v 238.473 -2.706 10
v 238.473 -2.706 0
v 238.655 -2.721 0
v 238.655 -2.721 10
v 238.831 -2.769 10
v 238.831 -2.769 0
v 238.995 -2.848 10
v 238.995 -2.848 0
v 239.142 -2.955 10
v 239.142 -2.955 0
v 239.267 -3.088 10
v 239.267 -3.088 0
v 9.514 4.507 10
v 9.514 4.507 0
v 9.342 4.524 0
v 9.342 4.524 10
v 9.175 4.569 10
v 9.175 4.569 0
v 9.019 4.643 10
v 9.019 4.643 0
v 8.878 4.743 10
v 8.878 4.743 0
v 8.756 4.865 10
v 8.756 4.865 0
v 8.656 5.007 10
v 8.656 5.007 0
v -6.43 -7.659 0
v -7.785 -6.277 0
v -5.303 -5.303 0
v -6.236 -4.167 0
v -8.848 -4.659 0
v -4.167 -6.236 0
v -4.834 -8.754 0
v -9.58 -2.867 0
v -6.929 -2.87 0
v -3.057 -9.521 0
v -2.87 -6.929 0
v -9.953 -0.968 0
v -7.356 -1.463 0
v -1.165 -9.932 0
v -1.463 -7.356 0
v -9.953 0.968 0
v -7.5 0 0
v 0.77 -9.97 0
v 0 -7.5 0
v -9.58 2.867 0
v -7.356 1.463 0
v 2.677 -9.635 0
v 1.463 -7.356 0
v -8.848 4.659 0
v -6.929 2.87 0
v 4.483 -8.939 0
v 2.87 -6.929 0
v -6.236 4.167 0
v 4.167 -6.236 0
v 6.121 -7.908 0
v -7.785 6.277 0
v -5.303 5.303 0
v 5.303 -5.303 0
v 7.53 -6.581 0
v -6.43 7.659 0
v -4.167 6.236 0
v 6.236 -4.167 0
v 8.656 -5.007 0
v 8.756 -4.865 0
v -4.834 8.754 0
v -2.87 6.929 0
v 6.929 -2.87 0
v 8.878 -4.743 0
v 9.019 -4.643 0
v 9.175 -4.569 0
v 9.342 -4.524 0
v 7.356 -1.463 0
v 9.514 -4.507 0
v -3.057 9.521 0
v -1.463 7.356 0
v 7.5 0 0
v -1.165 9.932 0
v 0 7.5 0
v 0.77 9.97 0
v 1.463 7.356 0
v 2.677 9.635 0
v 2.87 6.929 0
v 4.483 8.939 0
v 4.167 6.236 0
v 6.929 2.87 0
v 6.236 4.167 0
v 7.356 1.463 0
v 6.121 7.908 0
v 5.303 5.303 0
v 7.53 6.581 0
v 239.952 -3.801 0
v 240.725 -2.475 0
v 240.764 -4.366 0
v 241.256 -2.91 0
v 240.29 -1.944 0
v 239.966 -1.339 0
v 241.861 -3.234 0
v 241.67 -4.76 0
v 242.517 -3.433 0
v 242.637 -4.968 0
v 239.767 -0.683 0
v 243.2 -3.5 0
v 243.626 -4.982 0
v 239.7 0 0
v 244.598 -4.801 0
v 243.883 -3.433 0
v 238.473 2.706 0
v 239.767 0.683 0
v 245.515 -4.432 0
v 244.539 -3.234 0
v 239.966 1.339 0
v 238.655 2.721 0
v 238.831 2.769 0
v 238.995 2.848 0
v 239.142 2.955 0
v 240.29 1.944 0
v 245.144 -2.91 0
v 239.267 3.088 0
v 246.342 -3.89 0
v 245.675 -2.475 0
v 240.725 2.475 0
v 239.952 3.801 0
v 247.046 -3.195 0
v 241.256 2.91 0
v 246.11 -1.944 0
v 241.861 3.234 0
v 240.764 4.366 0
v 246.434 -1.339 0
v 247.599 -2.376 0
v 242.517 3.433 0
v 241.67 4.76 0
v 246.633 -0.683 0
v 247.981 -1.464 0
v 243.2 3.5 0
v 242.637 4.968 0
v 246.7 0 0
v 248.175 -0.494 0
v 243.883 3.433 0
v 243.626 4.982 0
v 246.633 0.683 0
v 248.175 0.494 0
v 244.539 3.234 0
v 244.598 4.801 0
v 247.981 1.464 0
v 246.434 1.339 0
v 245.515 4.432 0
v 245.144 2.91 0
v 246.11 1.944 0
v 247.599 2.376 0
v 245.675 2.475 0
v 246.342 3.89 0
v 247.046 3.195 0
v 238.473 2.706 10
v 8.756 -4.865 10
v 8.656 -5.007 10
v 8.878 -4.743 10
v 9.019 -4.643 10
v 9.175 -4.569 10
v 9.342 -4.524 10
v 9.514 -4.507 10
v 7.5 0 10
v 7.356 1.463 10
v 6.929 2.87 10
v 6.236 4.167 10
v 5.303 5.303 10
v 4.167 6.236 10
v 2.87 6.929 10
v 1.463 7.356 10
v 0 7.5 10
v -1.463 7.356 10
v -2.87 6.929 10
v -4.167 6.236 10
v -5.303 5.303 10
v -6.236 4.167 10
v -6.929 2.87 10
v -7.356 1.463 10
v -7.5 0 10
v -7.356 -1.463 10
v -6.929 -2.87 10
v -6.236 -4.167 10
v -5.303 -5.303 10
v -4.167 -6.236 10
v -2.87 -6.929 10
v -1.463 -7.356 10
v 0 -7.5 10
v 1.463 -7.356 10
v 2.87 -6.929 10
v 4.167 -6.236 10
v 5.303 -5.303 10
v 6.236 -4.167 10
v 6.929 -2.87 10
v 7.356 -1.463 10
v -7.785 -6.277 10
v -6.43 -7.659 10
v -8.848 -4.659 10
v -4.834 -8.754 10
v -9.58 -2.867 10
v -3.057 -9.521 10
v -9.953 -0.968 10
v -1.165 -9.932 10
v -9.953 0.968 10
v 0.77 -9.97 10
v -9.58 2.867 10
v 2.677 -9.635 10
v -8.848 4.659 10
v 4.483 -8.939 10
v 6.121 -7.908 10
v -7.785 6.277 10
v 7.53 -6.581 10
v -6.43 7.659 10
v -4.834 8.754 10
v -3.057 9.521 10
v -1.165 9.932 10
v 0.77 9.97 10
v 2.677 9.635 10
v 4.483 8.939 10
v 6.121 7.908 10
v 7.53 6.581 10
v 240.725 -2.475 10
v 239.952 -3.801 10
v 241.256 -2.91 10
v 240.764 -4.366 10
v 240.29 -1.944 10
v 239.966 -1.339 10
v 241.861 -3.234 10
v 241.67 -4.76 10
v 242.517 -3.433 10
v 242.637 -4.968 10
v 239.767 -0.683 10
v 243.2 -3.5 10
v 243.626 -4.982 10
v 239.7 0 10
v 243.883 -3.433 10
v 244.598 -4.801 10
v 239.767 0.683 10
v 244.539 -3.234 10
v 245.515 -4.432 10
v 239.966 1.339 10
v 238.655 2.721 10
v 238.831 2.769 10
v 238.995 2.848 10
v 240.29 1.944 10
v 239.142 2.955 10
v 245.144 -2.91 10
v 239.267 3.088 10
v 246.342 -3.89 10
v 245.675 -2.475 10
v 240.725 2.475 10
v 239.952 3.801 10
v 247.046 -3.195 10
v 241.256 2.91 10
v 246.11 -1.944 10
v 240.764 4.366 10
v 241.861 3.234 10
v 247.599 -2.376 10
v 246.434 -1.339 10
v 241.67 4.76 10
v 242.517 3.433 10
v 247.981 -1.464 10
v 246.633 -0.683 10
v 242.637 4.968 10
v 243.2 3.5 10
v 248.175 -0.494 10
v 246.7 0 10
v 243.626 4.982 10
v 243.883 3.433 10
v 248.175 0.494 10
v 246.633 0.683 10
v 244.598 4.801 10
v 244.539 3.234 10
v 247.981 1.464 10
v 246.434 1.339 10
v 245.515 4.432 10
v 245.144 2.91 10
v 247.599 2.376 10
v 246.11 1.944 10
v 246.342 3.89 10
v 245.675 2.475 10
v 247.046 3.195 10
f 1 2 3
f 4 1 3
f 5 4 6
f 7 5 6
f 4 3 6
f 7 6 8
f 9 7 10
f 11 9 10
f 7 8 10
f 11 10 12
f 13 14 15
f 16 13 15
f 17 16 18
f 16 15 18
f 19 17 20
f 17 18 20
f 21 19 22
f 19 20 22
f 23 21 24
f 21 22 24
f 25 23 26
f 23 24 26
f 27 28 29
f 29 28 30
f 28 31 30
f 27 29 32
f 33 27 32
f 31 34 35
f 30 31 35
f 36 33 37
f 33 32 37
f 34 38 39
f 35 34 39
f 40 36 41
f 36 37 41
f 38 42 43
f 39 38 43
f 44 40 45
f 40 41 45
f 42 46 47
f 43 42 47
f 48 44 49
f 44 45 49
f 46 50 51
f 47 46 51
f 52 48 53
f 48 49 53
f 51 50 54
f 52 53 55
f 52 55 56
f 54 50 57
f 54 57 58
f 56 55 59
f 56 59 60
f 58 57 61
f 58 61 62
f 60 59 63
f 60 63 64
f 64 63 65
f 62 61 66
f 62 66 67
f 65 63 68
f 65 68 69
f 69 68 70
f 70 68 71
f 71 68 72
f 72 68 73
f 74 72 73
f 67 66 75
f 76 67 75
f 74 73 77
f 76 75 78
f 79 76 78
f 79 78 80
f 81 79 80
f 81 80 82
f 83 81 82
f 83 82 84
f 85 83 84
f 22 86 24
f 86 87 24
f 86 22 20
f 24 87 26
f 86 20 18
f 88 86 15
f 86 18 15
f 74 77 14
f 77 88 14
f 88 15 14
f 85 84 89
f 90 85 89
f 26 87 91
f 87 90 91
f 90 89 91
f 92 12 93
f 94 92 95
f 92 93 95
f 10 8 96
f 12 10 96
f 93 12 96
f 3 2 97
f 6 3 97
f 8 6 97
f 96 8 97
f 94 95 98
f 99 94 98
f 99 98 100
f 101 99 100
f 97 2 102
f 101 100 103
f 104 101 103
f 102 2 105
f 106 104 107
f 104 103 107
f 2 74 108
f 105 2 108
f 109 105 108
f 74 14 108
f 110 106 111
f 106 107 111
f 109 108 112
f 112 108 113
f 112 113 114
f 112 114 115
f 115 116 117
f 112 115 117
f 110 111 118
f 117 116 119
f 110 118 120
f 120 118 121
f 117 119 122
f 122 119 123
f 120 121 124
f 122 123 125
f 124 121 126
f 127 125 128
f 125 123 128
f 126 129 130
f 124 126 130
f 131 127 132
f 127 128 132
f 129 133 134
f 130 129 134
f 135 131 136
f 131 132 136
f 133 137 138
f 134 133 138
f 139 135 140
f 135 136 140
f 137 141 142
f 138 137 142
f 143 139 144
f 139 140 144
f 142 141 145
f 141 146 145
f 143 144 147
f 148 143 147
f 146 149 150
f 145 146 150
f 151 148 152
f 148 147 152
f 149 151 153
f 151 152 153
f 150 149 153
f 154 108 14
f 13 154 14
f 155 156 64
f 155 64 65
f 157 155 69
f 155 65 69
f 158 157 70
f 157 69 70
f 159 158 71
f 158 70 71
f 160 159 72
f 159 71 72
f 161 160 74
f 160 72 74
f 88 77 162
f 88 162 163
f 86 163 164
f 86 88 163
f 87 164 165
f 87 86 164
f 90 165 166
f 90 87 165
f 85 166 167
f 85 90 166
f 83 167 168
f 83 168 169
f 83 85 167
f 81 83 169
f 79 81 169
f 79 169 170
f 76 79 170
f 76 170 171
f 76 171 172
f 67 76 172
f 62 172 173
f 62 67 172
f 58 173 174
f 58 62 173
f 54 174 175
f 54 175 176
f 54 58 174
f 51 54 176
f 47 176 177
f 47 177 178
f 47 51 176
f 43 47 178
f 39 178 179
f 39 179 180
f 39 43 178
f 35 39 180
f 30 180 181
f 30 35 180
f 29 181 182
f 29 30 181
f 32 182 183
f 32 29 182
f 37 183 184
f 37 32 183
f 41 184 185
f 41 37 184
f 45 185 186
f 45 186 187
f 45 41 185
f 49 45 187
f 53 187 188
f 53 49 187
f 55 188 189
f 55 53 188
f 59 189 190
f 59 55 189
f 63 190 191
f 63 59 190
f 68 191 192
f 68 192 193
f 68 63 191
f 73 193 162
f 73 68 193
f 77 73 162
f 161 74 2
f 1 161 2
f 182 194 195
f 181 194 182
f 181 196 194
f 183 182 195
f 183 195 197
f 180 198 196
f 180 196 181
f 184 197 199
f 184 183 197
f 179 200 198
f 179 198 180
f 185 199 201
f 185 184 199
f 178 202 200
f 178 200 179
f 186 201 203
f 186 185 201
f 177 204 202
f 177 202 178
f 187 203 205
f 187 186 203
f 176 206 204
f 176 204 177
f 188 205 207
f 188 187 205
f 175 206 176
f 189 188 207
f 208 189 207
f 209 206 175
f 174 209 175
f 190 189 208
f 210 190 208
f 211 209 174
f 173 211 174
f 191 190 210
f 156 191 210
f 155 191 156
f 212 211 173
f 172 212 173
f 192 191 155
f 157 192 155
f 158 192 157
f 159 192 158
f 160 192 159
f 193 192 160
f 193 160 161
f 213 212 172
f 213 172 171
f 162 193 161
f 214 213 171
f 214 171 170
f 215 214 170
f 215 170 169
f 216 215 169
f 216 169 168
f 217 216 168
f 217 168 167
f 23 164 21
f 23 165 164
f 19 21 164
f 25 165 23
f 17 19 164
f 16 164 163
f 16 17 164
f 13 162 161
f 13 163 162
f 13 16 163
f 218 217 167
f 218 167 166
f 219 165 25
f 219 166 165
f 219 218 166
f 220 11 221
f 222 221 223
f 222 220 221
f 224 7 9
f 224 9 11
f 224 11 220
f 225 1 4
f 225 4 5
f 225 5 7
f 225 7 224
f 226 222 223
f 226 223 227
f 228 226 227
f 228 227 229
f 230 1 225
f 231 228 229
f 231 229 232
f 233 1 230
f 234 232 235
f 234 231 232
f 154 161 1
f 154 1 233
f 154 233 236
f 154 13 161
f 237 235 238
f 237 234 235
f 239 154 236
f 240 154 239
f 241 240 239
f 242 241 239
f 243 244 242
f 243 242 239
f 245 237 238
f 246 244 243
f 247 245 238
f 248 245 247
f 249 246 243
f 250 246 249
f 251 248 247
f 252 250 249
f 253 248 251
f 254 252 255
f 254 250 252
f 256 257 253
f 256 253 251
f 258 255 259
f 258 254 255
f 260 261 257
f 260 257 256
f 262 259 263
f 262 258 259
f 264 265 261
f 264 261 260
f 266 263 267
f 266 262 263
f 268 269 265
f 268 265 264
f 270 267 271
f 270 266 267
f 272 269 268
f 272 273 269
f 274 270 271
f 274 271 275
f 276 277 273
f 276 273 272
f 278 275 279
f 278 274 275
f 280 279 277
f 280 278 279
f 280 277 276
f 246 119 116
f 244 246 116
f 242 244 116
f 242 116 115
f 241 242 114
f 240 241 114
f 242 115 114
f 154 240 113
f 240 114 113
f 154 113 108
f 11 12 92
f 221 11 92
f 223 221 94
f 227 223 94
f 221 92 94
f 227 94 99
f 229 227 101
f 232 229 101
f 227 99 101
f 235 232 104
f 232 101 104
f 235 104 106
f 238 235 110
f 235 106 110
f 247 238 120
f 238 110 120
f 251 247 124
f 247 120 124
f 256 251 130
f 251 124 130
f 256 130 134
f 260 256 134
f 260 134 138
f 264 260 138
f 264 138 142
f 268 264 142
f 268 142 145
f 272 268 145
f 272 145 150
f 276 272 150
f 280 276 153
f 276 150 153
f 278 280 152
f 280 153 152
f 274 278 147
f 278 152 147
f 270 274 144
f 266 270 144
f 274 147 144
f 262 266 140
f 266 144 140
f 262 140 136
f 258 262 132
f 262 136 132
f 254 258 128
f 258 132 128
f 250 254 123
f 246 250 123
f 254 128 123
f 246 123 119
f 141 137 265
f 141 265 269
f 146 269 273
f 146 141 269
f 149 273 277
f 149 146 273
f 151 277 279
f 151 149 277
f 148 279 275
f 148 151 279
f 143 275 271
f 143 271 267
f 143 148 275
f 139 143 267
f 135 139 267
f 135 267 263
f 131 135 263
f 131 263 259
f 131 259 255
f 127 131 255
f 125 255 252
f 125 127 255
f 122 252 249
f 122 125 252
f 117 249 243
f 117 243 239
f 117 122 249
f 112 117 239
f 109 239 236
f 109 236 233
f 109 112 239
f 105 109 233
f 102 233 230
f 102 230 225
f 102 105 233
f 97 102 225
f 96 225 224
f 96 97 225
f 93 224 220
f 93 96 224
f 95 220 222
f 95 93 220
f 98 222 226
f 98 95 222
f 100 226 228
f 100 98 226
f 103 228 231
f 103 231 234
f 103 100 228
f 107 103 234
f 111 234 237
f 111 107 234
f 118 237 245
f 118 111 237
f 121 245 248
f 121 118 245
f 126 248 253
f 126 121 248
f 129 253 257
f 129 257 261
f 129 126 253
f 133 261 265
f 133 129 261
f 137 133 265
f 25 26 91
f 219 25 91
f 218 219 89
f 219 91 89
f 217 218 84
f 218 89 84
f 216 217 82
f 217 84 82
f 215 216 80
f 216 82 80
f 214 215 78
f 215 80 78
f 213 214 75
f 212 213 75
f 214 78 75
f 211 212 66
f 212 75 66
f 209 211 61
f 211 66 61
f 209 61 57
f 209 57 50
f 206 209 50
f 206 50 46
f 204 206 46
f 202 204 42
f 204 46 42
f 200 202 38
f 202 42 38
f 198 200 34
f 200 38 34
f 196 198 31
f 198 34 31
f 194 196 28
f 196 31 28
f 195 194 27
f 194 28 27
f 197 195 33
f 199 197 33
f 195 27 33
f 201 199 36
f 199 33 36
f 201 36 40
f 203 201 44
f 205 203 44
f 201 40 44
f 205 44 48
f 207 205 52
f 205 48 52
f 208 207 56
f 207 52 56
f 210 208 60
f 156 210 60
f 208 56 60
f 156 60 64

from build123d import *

# Parameters (mm, degrees)
ESBO_O1_R                = 7.5
ESBO_O1_R_2              = 3.5
RESSALTO_EXTRUS_O1_DEPTH = 10


with BuildPart() as part:
    # Esboço1 → Ressalto-extrusão1 (new body)
    with BuildSketch(Plane.XY):
        with BuildLine():
            Line((9.514211155, -4.507297718), (238.473101757, -2.705535542))
            ThreePointArc((238.473101757, -2.705535542), (238.91470232, -2.804462383), (239.267475736, -3.087920483))
            ThreePointArc((239.267475736, -3.087920483), (248.2, 0), (239.267475736, 3.087920483))
            ThreePointArc((239.267475736, 3.087920483), (238.91470232, 2.804462383), (238.473101757, 2.705535542))
            Line((238.473101757, 2.705535542), (9.514211155, 4.507297718))
            ThreePointArc((9.514211155, 4.507297718), (9.019006357, 4.643023372), (8.656436619, 5.006606142))
            ThreePointArc((8.656436619, 5.006606142), (-10, 0), (8.656436619, -5.006606142))
            ThreePointArc((8.656436619, -5.006606142), (9.019006357, -4.643023372), (9.514211155, -4.507297718))
        make_face()
        Circle(ESBO_O1_R, mode=Mode.SUBTRACT)
        with Locations((243.2, 0)):
            Circle(ESBO_O1_R_2, mode=Mode.SUBTRACT)
    extrude(amount=RESSALTO_EXTRUS_O1_DEPTH)


solid = part.part
